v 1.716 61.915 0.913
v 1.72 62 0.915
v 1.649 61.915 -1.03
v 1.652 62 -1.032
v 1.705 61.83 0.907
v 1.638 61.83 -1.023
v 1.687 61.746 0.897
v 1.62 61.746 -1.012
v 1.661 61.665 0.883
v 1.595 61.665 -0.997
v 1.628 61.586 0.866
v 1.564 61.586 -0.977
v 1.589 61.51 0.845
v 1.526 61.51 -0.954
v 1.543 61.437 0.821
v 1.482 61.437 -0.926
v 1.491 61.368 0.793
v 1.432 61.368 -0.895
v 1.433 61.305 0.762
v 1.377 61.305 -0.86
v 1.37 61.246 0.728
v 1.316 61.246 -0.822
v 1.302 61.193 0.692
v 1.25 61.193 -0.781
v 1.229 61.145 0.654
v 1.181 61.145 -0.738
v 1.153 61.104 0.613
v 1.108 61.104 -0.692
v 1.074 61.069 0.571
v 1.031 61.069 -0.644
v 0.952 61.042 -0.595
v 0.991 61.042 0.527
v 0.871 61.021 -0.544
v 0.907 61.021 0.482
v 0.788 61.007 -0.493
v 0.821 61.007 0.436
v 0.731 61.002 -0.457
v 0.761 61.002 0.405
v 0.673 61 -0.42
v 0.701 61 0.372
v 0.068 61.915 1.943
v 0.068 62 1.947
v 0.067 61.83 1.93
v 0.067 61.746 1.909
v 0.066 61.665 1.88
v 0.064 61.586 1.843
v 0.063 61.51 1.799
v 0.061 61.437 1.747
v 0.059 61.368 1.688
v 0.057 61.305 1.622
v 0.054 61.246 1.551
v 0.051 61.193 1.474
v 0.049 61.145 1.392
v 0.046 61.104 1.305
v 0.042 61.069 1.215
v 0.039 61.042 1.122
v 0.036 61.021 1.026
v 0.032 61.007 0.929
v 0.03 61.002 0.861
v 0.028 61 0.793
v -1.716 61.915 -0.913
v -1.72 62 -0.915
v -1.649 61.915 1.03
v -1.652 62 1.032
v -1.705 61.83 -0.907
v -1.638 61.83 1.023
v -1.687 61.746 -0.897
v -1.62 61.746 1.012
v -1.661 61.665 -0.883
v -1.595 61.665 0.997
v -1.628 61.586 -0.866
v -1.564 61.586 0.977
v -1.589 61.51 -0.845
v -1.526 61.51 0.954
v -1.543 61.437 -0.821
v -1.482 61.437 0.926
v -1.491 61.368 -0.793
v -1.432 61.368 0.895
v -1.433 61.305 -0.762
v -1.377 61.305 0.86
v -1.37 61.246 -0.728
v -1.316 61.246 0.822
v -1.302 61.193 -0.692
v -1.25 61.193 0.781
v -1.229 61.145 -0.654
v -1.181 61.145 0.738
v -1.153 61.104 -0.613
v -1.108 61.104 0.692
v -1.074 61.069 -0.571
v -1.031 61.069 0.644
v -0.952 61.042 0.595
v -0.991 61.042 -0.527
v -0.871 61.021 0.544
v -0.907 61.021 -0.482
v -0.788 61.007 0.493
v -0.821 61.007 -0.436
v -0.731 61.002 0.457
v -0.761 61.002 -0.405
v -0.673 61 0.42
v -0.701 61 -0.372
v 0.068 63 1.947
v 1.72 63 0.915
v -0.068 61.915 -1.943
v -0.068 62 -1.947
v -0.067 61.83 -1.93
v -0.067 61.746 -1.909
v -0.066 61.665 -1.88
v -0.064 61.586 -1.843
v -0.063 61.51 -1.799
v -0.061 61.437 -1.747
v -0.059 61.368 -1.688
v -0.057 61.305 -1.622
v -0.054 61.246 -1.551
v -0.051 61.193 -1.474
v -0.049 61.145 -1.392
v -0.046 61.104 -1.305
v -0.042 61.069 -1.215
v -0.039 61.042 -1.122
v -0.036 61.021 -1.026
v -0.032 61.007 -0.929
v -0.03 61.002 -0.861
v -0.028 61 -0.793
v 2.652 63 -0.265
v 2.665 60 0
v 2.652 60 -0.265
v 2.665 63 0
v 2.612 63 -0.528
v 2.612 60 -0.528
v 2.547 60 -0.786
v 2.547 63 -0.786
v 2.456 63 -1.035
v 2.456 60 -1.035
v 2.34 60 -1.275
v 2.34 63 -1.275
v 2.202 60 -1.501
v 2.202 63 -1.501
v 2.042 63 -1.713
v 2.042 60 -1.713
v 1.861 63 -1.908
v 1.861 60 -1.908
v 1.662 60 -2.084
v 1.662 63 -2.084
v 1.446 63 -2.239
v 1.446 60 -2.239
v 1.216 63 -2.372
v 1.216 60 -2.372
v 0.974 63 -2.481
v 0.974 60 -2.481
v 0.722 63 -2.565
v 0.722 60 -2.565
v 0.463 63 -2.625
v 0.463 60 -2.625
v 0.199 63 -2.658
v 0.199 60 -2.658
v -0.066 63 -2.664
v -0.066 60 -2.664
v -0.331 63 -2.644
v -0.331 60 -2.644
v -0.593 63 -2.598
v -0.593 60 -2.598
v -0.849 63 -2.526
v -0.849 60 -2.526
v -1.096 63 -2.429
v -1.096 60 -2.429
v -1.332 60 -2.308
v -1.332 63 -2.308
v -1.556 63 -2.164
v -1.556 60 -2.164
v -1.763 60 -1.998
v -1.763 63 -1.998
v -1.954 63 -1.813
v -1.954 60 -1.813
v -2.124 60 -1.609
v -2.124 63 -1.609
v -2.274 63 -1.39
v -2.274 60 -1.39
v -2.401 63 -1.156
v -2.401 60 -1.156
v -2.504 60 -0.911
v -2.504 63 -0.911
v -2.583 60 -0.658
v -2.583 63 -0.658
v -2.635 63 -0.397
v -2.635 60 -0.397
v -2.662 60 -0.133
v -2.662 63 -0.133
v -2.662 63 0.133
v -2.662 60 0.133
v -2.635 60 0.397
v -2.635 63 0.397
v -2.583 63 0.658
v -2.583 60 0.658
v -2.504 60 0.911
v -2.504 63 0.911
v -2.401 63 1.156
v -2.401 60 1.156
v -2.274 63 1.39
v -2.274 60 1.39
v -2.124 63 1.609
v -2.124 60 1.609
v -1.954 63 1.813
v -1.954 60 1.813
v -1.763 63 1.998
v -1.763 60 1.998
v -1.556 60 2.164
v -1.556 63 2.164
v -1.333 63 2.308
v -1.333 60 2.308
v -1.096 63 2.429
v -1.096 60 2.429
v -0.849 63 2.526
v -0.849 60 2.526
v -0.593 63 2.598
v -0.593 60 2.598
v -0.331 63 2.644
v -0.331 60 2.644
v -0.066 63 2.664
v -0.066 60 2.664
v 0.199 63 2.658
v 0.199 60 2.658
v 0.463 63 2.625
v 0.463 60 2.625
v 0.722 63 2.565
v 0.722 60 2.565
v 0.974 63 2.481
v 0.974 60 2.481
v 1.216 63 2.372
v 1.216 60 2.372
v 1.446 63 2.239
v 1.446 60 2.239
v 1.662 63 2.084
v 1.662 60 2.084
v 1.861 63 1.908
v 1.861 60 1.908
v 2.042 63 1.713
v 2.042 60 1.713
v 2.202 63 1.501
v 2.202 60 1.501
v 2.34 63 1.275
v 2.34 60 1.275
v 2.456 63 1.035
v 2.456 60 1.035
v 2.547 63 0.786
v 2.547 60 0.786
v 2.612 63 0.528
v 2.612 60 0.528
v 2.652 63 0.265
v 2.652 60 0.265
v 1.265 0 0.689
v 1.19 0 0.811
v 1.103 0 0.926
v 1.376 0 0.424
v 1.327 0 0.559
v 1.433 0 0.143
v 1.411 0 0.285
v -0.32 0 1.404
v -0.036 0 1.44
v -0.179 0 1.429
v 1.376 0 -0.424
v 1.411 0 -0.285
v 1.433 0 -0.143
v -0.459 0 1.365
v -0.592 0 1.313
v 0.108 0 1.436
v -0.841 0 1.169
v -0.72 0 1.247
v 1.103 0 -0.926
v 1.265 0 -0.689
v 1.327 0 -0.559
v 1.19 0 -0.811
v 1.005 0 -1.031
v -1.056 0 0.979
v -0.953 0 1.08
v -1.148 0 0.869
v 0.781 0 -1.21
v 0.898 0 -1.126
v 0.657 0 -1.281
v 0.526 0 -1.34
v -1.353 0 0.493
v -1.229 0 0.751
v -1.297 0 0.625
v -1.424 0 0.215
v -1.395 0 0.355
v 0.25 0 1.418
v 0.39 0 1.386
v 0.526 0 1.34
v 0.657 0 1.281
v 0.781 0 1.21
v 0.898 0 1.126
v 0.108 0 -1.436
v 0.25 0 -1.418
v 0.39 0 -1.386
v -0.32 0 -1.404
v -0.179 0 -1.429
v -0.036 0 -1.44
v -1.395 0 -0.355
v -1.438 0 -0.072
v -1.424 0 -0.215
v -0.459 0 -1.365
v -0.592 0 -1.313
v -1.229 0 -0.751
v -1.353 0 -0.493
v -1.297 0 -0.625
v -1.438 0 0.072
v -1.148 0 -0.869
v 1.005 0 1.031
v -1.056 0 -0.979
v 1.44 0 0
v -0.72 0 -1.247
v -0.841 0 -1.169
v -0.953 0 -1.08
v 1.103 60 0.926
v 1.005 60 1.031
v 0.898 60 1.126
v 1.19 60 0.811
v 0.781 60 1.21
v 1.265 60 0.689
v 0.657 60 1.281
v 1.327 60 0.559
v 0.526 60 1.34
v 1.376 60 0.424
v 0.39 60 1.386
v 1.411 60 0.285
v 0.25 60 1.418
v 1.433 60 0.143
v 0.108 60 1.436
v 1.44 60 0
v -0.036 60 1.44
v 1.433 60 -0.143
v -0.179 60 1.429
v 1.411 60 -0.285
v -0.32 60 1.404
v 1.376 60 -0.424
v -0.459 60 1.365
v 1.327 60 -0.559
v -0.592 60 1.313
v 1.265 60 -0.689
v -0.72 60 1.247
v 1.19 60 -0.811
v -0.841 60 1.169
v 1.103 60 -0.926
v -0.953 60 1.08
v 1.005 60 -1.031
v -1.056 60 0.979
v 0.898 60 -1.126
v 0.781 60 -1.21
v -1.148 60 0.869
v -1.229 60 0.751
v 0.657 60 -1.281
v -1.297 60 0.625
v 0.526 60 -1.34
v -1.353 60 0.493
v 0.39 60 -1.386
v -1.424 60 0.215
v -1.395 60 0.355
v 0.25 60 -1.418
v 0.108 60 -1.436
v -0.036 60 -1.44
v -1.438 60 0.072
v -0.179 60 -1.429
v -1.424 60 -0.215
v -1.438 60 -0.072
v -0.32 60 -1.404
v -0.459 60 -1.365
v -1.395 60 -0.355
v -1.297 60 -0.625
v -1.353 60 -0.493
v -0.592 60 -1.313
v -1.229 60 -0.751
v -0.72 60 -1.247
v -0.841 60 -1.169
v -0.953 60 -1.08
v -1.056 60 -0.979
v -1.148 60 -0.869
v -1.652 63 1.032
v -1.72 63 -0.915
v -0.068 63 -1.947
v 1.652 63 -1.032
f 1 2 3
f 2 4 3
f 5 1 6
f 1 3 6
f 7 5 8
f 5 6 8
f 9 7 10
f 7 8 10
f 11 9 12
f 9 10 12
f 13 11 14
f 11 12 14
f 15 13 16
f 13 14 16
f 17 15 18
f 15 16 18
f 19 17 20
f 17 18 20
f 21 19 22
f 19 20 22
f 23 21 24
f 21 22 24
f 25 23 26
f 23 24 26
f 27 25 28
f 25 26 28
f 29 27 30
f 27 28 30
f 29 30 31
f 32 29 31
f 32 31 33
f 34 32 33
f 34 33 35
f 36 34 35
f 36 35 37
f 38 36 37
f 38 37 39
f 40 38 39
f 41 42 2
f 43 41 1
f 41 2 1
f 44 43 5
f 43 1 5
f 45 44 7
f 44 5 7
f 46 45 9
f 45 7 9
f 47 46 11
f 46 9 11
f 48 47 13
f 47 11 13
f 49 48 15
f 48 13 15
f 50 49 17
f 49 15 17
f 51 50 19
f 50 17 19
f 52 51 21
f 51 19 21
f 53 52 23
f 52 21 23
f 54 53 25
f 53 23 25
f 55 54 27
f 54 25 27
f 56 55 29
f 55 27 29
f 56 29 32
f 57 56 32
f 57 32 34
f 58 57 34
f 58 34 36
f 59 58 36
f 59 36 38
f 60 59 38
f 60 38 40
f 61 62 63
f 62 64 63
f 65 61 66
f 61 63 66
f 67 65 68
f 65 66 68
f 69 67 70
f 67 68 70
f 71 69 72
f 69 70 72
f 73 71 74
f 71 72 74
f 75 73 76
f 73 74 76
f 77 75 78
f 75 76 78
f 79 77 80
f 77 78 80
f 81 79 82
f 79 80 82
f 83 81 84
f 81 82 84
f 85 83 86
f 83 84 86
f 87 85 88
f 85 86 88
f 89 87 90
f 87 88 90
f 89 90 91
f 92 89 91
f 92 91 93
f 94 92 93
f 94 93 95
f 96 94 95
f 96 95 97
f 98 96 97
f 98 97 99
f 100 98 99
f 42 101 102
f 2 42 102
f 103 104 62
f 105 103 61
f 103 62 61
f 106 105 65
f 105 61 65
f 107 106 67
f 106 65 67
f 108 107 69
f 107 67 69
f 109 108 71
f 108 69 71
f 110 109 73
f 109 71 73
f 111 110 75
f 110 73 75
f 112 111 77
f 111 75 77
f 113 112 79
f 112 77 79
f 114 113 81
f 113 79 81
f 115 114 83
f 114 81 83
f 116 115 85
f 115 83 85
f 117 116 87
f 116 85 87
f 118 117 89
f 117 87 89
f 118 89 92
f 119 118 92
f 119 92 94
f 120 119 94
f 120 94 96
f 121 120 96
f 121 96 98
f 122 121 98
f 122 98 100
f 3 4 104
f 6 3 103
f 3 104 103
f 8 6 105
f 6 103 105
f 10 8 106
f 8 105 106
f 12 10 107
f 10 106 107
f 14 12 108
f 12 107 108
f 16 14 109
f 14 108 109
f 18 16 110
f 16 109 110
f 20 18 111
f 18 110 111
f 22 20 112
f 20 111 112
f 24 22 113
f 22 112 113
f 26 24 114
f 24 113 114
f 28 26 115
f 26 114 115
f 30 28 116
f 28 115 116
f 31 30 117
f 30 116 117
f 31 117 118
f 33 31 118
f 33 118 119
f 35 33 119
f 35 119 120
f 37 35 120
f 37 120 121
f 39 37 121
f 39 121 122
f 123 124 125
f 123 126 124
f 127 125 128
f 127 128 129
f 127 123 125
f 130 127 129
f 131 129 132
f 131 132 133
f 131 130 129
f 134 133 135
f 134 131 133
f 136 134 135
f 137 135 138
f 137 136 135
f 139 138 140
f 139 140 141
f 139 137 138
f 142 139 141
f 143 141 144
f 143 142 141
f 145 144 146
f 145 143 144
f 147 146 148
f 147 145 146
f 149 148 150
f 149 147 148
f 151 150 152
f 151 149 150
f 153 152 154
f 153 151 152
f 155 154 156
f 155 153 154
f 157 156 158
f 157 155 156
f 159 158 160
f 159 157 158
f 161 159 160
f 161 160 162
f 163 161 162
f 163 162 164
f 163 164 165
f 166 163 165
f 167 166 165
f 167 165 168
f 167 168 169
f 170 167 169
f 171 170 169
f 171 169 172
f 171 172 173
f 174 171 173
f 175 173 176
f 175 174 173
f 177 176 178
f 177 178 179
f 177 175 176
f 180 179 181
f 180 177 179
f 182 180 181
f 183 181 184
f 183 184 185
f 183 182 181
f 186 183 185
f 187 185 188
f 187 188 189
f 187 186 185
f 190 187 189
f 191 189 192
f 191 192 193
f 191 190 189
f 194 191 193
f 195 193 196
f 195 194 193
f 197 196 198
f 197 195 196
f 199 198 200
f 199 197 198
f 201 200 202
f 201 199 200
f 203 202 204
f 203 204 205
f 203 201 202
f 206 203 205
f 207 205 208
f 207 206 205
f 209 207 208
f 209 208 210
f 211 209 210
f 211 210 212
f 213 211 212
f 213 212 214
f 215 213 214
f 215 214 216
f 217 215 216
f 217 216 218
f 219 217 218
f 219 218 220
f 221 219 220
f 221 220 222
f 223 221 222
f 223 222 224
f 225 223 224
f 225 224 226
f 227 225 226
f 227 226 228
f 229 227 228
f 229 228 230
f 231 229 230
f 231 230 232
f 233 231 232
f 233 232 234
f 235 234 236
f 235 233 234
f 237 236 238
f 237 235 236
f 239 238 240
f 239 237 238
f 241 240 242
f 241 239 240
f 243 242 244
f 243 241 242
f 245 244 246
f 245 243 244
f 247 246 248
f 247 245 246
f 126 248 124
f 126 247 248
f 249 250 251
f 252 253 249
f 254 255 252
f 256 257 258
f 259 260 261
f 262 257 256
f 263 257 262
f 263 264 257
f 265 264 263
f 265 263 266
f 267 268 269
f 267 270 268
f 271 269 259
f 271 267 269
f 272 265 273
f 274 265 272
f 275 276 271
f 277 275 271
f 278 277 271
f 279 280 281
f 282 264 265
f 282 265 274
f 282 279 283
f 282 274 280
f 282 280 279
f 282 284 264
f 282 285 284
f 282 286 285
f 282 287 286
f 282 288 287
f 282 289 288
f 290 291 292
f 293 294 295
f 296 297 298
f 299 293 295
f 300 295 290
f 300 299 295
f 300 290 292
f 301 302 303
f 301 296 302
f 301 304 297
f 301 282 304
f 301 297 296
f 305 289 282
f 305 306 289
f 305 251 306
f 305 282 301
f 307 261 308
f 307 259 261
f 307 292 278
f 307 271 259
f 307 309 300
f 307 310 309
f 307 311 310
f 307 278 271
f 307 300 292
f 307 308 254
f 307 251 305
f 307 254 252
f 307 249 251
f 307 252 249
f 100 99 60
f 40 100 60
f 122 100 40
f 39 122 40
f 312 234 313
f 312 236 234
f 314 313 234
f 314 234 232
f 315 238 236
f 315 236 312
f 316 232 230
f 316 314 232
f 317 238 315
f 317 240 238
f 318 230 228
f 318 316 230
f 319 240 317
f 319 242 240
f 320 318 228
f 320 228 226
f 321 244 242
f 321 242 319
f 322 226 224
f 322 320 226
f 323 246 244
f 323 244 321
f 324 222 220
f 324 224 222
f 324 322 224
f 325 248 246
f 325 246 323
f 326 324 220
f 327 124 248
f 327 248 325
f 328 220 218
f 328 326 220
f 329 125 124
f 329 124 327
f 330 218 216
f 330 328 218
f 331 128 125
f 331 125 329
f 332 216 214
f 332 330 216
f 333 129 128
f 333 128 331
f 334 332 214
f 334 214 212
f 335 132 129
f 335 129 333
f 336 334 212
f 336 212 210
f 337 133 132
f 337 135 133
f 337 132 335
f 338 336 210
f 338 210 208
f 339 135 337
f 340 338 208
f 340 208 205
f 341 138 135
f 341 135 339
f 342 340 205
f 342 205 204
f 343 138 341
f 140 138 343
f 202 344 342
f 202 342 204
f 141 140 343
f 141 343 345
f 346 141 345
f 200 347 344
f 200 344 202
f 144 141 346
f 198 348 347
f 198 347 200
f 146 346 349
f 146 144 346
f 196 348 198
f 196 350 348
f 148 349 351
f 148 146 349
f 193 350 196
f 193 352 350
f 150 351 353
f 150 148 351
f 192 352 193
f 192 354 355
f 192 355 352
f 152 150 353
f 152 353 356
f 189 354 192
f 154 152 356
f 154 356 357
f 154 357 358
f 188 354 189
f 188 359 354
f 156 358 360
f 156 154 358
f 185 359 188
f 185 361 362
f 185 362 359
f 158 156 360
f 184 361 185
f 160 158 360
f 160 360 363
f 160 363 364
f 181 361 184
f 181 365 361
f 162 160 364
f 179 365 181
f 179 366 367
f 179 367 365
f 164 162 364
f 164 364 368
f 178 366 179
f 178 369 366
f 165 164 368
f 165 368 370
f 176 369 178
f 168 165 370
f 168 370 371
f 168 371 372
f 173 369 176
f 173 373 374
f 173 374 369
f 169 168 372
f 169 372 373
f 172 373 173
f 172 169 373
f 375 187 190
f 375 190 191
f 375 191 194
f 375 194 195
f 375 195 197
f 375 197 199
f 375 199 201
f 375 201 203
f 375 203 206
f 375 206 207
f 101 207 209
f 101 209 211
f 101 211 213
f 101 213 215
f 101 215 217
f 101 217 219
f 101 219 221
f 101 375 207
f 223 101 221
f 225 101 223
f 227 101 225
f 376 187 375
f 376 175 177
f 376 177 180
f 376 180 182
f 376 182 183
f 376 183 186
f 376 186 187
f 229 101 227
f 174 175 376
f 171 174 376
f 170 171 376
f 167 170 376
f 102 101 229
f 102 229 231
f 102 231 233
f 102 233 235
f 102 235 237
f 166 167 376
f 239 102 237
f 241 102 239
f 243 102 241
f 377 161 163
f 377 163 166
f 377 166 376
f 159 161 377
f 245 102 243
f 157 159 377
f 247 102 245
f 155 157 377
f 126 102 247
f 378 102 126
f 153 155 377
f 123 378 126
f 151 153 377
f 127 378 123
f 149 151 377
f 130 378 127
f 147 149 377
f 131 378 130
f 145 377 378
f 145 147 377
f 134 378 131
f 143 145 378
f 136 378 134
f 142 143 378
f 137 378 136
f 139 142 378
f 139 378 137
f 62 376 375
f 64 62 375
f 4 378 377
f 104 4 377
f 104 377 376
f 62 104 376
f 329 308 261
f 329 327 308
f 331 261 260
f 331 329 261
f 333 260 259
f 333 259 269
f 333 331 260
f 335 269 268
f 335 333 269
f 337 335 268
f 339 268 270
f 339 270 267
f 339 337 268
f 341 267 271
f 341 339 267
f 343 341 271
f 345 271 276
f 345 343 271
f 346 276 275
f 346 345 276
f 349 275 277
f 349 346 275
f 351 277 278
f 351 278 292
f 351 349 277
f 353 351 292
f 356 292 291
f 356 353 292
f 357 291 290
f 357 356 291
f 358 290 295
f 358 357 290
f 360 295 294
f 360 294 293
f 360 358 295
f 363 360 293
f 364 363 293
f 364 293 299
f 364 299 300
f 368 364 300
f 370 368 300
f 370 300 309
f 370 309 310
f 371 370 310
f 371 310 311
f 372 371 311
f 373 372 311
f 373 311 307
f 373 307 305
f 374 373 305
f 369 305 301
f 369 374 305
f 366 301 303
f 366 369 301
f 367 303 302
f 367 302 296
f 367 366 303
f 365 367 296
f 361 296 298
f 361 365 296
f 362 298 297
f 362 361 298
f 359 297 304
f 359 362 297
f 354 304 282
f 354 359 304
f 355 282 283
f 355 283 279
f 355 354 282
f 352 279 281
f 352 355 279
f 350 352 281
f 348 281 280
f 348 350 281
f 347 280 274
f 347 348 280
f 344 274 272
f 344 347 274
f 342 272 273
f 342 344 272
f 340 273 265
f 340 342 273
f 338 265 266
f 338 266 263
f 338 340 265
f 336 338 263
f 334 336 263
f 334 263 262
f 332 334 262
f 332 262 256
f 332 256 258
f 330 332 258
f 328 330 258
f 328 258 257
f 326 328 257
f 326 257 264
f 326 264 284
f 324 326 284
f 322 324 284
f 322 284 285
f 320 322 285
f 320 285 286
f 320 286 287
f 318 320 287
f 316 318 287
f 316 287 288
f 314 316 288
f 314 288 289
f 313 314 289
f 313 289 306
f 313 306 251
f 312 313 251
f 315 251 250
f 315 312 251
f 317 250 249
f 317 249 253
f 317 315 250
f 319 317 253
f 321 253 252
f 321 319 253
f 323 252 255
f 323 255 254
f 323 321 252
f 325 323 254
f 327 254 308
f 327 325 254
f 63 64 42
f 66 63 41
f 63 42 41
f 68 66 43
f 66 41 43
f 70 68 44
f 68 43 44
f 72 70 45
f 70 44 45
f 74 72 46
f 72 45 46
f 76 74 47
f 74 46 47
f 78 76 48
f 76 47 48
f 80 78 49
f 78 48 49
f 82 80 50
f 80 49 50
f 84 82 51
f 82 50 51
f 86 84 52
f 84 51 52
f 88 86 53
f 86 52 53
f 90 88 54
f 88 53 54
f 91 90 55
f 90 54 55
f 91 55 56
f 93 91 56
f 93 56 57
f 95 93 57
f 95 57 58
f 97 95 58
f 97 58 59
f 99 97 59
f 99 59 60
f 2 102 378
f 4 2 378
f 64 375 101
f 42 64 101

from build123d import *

# Parameters (mm, degrees)
CUT_EXTRUDE1_DEPTH = 2
FILLET1_R          = 1


with BuildPart() as part:
    # Sketch1 → Revolve2 (revolve)
    with BuildSketch(Plane.XY):
        Polygon((0, 0), (1.44, 0), (1.44, 60), (2.665, 60), (2.665, 63), (0, 63), align=None)
    revolve(axis=Axis((0, 0, 0), (0, 1, 0)))

    # Sketch3 → Cut-Extrude1 (cut)
    with BuildSketch(Plane(origin=(0, 63, 0), x_dir=(1, 0, 0), z_dir=(0, 1, 0))):
        Polygon((1.720029198, -0.914625258), (1.652103308, 1.032276352), (-0.067925891, 1.94690161), (-1.720029198, 0.914625258), (-1.652103308, -1.032276352), (0.067925891, -1.94690161), align=None)
    extrude(amount=-CUT_EXTRUDE1_DEPTH, mode=Mode.SUBTRACT)

    # Fillet1
    fillet1_edges = [part.edges().sort_by_distance(p)[0] for p in [
        (0.893977545, 61, 1.430763434),
        (-0.792088708, 61, 1.489588981),
        (-1.686066253, 61, 0.058825547),
        (-0.893977545, 61, -1.430763434),
        (0.792088708, 61, -1.489588981),
        (1.686066253, 61, -0.058825547),
    ]]
    fillet(fillet1_edges, radius=FILLET1_R)


solid = part.part
